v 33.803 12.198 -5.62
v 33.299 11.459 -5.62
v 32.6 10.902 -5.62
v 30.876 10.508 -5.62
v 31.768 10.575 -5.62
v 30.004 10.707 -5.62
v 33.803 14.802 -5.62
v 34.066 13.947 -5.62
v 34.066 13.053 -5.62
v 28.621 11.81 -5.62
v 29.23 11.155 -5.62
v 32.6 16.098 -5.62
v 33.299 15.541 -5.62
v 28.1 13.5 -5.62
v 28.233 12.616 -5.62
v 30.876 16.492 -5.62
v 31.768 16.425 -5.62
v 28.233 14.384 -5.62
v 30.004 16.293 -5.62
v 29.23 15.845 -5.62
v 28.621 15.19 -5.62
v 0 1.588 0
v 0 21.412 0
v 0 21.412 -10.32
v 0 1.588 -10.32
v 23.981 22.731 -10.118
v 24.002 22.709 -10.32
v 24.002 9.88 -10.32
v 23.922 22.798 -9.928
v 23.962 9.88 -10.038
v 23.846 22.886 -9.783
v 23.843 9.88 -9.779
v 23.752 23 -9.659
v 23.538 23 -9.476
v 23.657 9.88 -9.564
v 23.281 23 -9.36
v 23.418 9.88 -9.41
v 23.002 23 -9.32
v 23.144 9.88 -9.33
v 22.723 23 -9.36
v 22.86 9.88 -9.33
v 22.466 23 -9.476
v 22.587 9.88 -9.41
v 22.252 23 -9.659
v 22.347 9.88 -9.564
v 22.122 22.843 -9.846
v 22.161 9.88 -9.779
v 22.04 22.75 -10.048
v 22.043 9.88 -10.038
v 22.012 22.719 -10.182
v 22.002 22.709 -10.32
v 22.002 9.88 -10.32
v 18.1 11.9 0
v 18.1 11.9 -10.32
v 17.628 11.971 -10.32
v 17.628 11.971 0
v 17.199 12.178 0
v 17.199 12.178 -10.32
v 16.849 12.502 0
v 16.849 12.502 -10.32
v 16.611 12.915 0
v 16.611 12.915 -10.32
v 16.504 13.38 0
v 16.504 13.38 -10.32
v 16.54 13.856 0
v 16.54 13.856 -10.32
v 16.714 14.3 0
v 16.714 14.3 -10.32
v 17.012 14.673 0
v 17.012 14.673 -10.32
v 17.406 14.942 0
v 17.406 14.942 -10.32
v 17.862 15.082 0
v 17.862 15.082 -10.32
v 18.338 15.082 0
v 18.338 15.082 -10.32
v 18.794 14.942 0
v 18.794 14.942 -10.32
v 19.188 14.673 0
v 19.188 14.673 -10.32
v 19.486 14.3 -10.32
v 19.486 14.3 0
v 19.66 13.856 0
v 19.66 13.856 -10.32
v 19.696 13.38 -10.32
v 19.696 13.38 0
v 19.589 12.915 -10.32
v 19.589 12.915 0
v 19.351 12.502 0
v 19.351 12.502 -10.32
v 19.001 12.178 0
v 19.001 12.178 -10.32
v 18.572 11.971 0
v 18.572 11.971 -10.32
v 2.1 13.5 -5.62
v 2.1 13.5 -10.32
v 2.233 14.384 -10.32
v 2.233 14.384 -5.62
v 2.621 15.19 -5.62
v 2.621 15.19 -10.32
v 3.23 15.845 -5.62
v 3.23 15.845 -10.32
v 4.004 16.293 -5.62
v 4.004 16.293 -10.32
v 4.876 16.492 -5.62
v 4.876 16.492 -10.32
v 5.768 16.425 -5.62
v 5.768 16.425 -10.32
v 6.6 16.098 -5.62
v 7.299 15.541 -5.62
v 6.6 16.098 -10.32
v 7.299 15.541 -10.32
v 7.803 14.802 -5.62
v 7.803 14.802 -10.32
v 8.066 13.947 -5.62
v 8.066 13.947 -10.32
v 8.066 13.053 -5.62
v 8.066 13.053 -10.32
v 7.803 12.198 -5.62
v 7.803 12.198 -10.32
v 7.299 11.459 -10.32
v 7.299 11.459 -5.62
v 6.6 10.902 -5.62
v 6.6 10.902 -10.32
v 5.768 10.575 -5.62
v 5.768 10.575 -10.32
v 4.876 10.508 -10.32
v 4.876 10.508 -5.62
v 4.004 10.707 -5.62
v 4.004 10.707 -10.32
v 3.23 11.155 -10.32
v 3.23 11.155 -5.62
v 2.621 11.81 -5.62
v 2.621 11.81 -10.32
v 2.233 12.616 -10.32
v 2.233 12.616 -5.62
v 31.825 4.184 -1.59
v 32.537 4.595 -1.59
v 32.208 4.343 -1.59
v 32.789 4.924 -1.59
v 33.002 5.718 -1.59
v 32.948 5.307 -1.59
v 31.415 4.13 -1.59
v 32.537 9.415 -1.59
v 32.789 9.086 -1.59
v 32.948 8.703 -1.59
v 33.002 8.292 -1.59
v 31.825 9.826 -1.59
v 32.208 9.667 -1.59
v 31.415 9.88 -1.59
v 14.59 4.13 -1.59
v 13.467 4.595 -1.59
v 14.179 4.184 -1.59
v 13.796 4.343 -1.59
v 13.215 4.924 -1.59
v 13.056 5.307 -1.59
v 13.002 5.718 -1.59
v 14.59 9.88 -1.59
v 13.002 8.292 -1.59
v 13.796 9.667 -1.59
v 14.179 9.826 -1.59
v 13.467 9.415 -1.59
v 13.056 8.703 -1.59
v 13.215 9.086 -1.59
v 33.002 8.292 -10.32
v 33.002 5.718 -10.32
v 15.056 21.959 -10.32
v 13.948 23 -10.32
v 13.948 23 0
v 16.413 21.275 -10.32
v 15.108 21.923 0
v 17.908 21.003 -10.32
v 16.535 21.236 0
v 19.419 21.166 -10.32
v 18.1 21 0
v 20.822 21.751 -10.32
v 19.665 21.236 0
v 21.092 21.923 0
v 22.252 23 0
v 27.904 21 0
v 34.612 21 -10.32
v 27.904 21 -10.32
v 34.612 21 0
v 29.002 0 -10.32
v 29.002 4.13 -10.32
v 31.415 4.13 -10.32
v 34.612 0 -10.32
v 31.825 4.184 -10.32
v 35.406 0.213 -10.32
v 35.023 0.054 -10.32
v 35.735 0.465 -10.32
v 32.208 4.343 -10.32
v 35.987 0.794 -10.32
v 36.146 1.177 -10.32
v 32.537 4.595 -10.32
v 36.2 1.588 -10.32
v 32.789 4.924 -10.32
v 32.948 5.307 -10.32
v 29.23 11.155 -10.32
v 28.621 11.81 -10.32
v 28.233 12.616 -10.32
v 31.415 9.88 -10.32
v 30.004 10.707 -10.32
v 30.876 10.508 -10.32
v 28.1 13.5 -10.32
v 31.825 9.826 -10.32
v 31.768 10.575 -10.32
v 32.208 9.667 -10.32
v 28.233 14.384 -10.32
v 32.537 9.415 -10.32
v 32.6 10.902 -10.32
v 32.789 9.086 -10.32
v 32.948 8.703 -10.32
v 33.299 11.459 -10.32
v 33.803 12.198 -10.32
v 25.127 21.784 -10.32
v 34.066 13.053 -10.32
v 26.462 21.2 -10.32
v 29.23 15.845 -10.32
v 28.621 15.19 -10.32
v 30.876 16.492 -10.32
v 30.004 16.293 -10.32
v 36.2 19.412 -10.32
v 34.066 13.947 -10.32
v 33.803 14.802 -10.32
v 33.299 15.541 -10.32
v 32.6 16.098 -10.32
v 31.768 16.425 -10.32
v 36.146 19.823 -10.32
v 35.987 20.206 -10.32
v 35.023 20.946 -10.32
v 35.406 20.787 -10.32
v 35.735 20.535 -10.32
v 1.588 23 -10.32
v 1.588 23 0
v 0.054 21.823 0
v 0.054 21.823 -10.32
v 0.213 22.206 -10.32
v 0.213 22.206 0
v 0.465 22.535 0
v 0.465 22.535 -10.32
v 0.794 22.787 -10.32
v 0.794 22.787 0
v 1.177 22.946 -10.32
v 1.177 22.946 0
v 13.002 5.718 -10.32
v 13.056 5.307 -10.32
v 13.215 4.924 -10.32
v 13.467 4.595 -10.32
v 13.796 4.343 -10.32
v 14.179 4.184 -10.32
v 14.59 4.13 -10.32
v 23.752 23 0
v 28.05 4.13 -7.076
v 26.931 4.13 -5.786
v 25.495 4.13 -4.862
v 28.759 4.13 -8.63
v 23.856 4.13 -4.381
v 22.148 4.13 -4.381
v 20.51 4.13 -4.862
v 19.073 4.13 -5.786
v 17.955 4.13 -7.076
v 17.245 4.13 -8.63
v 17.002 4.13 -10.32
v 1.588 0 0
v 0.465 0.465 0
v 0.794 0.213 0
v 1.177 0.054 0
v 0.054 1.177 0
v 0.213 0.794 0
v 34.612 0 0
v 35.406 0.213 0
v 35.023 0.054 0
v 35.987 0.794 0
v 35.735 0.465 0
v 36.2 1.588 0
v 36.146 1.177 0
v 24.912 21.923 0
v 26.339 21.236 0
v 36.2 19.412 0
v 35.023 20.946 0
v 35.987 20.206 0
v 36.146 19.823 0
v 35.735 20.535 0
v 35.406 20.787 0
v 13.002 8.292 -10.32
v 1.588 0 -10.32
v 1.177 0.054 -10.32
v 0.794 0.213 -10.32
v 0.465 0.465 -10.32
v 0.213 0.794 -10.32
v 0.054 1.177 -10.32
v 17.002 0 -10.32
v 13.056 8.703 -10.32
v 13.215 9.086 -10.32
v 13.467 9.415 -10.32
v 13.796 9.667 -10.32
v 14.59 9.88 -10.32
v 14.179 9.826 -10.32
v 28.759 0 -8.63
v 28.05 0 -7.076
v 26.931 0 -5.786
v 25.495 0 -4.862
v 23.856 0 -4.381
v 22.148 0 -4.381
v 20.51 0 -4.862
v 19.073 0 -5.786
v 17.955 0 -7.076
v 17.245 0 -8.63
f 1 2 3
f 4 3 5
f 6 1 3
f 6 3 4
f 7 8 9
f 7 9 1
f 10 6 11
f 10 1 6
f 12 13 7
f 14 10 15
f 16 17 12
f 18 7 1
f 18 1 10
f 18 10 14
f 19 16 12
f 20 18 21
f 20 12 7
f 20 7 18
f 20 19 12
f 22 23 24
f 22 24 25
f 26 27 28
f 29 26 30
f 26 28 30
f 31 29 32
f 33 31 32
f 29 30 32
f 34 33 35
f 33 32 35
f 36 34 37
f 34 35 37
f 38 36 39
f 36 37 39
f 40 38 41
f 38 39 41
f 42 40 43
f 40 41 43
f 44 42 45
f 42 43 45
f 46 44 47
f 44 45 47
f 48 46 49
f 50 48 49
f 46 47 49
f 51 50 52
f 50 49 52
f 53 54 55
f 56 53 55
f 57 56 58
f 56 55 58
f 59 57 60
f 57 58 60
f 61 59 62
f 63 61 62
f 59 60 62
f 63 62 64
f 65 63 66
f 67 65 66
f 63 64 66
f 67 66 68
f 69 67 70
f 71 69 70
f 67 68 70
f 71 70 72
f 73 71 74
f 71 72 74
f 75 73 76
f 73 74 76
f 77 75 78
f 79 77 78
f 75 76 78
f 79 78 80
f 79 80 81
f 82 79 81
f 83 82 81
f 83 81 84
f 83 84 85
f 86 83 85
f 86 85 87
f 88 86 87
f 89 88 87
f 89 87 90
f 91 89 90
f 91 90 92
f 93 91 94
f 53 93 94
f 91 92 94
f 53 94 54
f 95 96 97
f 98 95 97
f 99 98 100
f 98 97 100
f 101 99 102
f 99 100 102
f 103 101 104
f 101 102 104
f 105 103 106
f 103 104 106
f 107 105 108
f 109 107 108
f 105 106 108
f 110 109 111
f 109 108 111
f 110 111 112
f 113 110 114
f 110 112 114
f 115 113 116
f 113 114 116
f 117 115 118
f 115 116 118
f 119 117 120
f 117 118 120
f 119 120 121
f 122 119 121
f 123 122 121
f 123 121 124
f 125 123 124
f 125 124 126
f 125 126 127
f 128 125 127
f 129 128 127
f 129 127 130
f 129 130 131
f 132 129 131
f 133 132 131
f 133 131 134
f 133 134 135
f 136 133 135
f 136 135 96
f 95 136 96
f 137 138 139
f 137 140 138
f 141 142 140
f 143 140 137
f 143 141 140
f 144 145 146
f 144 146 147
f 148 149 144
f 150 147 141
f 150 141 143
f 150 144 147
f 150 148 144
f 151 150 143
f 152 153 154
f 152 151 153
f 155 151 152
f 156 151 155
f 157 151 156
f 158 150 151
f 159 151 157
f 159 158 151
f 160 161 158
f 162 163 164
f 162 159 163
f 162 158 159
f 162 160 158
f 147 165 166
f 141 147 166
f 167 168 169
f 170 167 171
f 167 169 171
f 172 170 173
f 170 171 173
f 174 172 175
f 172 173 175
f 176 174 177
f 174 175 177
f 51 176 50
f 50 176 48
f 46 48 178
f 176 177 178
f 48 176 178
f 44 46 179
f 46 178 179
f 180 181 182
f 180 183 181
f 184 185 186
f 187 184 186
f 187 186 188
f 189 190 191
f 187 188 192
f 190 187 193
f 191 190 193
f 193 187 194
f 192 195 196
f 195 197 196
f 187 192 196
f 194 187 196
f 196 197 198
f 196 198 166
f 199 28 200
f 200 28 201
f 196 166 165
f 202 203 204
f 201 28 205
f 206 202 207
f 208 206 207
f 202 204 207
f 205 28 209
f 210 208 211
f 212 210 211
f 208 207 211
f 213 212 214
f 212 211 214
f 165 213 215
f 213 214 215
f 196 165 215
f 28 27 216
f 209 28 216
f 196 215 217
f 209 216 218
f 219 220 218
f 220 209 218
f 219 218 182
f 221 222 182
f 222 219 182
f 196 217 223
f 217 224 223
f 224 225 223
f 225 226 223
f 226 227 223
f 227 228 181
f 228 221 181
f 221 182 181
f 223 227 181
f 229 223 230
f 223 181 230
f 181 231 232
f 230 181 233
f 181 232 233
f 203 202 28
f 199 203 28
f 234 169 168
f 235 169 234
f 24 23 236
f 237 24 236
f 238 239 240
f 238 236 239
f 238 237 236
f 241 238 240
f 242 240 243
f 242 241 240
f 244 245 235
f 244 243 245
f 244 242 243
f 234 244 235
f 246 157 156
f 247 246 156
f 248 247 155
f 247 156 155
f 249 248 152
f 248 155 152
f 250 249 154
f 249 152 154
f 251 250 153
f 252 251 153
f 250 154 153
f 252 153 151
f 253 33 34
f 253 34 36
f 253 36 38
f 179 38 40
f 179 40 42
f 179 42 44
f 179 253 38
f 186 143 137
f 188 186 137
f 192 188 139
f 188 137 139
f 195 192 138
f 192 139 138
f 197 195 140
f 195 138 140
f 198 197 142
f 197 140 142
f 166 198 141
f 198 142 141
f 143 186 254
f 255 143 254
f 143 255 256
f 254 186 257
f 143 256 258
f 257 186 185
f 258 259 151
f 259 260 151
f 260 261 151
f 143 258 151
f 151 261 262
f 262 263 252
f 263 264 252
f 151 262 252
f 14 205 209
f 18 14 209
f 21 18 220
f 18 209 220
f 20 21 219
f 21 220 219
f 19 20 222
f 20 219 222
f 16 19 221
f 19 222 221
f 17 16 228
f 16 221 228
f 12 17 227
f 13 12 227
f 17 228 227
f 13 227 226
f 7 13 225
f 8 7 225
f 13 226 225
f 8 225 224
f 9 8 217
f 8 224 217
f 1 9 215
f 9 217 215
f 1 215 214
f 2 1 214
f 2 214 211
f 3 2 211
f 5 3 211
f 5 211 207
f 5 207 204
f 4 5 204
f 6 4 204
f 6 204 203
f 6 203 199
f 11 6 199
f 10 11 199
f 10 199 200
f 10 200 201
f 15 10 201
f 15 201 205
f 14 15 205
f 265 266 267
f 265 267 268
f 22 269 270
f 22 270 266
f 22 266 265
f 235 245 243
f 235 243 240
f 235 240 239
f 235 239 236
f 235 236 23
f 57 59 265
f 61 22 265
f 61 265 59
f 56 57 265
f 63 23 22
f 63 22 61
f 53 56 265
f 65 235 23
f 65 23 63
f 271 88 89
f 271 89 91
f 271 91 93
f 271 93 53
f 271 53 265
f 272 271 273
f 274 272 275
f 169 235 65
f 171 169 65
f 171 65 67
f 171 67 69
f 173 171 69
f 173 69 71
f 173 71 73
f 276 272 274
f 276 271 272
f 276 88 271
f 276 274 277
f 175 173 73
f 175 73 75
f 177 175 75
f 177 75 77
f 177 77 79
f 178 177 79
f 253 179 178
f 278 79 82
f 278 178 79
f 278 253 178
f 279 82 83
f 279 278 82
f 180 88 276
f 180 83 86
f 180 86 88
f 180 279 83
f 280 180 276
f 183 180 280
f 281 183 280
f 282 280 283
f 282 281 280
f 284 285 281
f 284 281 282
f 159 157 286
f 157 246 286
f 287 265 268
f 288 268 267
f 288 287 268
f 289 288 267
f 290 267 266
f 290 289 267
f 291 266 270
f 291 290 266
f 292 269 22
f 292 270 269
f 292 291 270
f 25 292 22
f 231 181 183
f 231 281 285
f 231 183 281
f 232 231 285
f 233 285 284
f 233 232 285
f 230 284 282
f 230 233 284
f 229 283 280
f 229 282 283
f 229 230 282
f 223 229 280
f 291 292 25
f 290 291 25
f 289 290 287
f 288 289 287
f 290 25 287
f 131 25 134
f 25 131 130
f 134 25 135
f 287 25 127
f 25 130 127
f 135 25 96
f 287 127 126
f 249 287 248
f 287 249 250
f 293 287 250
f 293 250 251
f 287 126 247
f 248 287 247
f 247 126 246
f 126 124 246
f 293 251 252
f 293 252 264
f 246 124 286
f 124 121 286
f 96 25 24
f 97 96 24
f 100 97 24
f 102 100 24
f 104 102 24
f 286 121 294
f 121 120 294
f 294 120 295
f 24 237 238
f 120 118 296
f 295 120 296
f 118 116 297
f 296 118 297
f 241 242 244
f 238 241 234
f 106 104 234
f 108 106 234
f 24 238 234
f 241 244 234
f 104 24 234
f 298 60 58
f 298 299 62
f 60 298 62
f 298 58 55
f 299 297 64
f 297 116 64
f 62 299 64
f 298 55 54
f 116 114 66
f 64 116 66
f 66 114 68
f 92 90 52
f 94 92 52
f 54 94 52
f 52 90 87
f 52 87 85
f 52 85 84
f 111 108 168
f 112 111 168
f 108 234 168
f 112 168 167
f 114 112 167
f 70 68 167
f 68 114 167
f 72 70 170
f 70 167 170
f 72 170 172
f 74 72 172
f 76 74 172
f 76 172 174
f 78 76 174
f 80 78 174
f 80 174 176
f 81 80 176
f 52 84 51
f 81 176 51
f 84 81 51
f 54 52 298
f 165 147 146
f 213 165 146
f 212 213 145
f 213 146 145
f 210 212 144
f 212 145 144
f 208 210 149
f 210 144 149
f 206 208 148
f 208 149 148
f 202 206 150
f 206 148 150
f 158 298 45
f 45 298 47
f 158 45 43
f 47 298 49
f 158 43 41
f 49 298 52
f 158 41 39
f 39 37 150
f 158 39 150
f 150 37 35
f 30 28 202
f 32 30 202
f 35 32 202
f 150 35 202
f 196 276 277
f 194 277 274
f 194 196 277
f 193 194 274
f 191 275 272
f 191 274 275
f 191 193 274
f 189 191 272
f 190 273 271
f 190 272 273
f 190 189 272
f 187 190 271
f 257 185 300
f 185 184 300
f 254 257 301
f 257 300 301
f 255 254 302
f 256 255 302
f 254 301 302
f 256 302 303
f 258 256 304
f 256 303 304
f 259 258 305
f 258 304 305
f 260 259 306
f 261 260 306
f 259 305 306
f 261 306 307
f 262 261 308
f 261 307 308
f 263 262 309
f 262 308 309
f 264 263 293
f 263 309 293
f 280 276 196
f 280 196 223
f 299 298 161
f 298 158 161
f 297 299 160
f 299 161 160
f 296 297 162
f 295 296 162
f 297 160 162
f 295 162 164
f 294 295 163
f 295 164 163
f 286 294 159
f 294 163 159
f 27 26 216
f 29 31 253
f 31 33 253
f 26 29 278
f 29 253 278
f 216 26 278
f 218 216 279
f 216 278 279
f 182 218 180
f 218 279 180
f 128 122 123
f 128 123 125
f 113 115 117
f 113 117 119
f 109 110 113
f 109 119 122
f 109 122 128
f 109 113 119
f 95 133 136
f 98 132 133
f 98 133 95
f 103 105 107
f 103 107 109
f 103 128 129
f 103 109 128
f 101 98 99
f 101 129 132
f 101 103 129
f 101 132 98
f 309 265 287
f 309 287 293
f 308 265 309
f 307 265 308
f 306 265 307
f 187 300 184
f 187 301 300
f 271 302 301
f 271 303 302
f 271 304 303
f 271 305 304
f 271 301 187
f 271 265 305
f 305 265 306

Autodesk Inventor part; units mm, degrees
ref_plane "YZ Plane" through (0, 0, 0) normal (1, 0, 0) x (0, 1, 0)
ref_plane "XZ Plane" through (0, 0, 0) normal (0, 1, 0) x (-1, 0, 0)
sketch "Sketch1" plane through (0, 0, 0) normal (0, 0, 1) x (1, 0, 0)
  line L0 (0, 0) -> (36.2, 0)
  line L1 (36.2, 0) -> (36.2, 23)
  line L2 (36.2, 23) -> (0, 23)
  line L3 (0, 23) -> (0, 0)
  dimension "d0" = 36.2
  dimension "d1" = 23
extrude "Extrusion1" add sketch "Sketch1" against normal blind 10.32
sketch "Sketch2" plane through (0, 0, 0) normal (0, 0, 1) x (1, 0, 0)
  line L0 (0, 0) -> (36.2, 0) projected
  line L1 (36.2, 0) -> (36.2, 23) projected
  circle A0 centre (18.1, 13.5) radius 1.5
  dimension "d4" = 3
  dimension "d5" = 18.1
  dimension "d6" = 13.5
hole "Hole1" at (18.1, 13.5, 0) direction (0, 0, -1) diameter 3.2 end through all clearance for "Flat Head Machine Screw" size "M3" standard "Ansi Metric M Profile"
sketch "Sketch3" plane through (0, 0, 0) normal (0, 0, 1) x (1, 0, 0)
  circle A0 centre (18.1, 13.5) radius 1.6 projected
  line L0 (0, 0) -> (36.2, 0) projected
  line L1 (36.2, 0) -> (36.2, 23) projected
  line L2 (36.2, 23) -> (0, 23) projected
  line L3 (0, 23) -> (0, 0) projected
  line L4 (36.2, 21) -> (27.9042, 21)
  arc A1 (23.7521, 23) -> (27.9042, 21) centre (27.9042, 26.31) ccw
  arc A2 (13.9479, 23) -> (22.2521, 23) centre (18.1, 26.31) ccw
  line L5 (18.1, 21) -> (18.1, 0) construction
  dimension "d14" = 3.2
  dimension "d15" = 21
  dimension "d16" = 5.31
  dimension "d17" = 1.5
extrude "Extrusion2" cut sketch "Sketch3" against normal blind 10.32 contours L4 A1 L2 L1 | L2 A2
sketch "Sketch4" plane through (0, 0, -10.32) normal (0, 0, -1) x (-1, 0, 0)
  circle A0 centre (-18.1, 13.5) radius 1.6 projected
  line L0 (-36.2, 21) -> (-36.2, 0) projected
  line L1 (0, 0) -> (0, 23) projected
  circle A1 centre (-31.1, 13.5) radius 3
  circle A2 centre (-5.1, 13.5) radius 3
  line L2 (-34.1, 13.5) -> (-36.2, 13.5)
  line L3 (-2.1, 13.5) -> (0, 13.5)
  point P0 (-35.15, 13.5)
  dimension "d21" = 6
  dimension "d20" = 26
extrude "Extrusion3" cut sketch "Sketch4" against normal blind 4.7 contours A1 | A2
sketch "Sketch6" plane through (0, 0, -10.32) normal (0, 0, -1) x (-1, 0, 0)
  line L0 (-22.2521, 23) -> (-23.7521, 23) projected
  line L1 (-36.2, 0) -> (0, 0) projected
  line L2 (-33.0021, 4.13) -> (-13.0021, 4.13)
  line L3 (-13.0021, 4.13) -> (-13.0021, 9.88)
  line L4 (-13.0021, 9.88) -> (-33.0021, 9.88)
  line L5 (-33.0021, 9.88) -> (-33.0021, 4.13)
  point P0 (-23.0021, 23)
  point P1 (-23.0021, 9.88)
  dimension "d27" = 5.75
  dimension "d28" = 20
  dimension "d29" = 4.13
extrude "Extrusion5" cut sketch "Sketch6" against normal blind 8.73
fillet "Fillet1" radius 1.5875 4 edges at (13.0021, 9.88, -5.955) (13.0021, 4.13, -5.955) (33.0021, 9.88, -5.955) (33.0021, 4.13, -5.955)
fillet "Fillet2" radius 1.5875 4 edges at (36.2, 21, -5.16) (36.2, 0, -5.16) (0, 0, -5.16) (0, 23, -5.16)
sketch "Sketch5" plane through (0, 0, 0) normal (0, -1, 0) x (1, 0, 0)
  line L0 (23.7521, 0) -> (22.2521, 0) projected
  circle A0 centre (23.0021, 0) radius 1 construction
  line L1 (36.2, -10.32) -> (0, -10.32) projected
  circle A1 centre (23.0021, -10.32) radius 1
  dimension "d24" = 2
extrude "Extrusion4" cut sketch "Sketch5" against normal through all
sketch "Sketch7" plane through (1.5875, 0, 0) normal (0, -1, 0) x (1, 0, 0)
  arc A0 (22.4146, -10.32) -> (20.4146, -10.32) centre (21.4146, -10.32) ccw projected
  circle A1 centre (21.4146, -10.32) radius 6
  point P0 (-1.5875, 0)
  dimension "d34" = 12
extrude "Extrusion6" cut sketch "Sketch7" against normal up to surface (4.13 mm away)
ref_plane "Work Plane1" through (23.0021, 0, -10.32) normal (1, 0, 0) x (0, 0, -1)
properties part number "hotend-holder-front"
